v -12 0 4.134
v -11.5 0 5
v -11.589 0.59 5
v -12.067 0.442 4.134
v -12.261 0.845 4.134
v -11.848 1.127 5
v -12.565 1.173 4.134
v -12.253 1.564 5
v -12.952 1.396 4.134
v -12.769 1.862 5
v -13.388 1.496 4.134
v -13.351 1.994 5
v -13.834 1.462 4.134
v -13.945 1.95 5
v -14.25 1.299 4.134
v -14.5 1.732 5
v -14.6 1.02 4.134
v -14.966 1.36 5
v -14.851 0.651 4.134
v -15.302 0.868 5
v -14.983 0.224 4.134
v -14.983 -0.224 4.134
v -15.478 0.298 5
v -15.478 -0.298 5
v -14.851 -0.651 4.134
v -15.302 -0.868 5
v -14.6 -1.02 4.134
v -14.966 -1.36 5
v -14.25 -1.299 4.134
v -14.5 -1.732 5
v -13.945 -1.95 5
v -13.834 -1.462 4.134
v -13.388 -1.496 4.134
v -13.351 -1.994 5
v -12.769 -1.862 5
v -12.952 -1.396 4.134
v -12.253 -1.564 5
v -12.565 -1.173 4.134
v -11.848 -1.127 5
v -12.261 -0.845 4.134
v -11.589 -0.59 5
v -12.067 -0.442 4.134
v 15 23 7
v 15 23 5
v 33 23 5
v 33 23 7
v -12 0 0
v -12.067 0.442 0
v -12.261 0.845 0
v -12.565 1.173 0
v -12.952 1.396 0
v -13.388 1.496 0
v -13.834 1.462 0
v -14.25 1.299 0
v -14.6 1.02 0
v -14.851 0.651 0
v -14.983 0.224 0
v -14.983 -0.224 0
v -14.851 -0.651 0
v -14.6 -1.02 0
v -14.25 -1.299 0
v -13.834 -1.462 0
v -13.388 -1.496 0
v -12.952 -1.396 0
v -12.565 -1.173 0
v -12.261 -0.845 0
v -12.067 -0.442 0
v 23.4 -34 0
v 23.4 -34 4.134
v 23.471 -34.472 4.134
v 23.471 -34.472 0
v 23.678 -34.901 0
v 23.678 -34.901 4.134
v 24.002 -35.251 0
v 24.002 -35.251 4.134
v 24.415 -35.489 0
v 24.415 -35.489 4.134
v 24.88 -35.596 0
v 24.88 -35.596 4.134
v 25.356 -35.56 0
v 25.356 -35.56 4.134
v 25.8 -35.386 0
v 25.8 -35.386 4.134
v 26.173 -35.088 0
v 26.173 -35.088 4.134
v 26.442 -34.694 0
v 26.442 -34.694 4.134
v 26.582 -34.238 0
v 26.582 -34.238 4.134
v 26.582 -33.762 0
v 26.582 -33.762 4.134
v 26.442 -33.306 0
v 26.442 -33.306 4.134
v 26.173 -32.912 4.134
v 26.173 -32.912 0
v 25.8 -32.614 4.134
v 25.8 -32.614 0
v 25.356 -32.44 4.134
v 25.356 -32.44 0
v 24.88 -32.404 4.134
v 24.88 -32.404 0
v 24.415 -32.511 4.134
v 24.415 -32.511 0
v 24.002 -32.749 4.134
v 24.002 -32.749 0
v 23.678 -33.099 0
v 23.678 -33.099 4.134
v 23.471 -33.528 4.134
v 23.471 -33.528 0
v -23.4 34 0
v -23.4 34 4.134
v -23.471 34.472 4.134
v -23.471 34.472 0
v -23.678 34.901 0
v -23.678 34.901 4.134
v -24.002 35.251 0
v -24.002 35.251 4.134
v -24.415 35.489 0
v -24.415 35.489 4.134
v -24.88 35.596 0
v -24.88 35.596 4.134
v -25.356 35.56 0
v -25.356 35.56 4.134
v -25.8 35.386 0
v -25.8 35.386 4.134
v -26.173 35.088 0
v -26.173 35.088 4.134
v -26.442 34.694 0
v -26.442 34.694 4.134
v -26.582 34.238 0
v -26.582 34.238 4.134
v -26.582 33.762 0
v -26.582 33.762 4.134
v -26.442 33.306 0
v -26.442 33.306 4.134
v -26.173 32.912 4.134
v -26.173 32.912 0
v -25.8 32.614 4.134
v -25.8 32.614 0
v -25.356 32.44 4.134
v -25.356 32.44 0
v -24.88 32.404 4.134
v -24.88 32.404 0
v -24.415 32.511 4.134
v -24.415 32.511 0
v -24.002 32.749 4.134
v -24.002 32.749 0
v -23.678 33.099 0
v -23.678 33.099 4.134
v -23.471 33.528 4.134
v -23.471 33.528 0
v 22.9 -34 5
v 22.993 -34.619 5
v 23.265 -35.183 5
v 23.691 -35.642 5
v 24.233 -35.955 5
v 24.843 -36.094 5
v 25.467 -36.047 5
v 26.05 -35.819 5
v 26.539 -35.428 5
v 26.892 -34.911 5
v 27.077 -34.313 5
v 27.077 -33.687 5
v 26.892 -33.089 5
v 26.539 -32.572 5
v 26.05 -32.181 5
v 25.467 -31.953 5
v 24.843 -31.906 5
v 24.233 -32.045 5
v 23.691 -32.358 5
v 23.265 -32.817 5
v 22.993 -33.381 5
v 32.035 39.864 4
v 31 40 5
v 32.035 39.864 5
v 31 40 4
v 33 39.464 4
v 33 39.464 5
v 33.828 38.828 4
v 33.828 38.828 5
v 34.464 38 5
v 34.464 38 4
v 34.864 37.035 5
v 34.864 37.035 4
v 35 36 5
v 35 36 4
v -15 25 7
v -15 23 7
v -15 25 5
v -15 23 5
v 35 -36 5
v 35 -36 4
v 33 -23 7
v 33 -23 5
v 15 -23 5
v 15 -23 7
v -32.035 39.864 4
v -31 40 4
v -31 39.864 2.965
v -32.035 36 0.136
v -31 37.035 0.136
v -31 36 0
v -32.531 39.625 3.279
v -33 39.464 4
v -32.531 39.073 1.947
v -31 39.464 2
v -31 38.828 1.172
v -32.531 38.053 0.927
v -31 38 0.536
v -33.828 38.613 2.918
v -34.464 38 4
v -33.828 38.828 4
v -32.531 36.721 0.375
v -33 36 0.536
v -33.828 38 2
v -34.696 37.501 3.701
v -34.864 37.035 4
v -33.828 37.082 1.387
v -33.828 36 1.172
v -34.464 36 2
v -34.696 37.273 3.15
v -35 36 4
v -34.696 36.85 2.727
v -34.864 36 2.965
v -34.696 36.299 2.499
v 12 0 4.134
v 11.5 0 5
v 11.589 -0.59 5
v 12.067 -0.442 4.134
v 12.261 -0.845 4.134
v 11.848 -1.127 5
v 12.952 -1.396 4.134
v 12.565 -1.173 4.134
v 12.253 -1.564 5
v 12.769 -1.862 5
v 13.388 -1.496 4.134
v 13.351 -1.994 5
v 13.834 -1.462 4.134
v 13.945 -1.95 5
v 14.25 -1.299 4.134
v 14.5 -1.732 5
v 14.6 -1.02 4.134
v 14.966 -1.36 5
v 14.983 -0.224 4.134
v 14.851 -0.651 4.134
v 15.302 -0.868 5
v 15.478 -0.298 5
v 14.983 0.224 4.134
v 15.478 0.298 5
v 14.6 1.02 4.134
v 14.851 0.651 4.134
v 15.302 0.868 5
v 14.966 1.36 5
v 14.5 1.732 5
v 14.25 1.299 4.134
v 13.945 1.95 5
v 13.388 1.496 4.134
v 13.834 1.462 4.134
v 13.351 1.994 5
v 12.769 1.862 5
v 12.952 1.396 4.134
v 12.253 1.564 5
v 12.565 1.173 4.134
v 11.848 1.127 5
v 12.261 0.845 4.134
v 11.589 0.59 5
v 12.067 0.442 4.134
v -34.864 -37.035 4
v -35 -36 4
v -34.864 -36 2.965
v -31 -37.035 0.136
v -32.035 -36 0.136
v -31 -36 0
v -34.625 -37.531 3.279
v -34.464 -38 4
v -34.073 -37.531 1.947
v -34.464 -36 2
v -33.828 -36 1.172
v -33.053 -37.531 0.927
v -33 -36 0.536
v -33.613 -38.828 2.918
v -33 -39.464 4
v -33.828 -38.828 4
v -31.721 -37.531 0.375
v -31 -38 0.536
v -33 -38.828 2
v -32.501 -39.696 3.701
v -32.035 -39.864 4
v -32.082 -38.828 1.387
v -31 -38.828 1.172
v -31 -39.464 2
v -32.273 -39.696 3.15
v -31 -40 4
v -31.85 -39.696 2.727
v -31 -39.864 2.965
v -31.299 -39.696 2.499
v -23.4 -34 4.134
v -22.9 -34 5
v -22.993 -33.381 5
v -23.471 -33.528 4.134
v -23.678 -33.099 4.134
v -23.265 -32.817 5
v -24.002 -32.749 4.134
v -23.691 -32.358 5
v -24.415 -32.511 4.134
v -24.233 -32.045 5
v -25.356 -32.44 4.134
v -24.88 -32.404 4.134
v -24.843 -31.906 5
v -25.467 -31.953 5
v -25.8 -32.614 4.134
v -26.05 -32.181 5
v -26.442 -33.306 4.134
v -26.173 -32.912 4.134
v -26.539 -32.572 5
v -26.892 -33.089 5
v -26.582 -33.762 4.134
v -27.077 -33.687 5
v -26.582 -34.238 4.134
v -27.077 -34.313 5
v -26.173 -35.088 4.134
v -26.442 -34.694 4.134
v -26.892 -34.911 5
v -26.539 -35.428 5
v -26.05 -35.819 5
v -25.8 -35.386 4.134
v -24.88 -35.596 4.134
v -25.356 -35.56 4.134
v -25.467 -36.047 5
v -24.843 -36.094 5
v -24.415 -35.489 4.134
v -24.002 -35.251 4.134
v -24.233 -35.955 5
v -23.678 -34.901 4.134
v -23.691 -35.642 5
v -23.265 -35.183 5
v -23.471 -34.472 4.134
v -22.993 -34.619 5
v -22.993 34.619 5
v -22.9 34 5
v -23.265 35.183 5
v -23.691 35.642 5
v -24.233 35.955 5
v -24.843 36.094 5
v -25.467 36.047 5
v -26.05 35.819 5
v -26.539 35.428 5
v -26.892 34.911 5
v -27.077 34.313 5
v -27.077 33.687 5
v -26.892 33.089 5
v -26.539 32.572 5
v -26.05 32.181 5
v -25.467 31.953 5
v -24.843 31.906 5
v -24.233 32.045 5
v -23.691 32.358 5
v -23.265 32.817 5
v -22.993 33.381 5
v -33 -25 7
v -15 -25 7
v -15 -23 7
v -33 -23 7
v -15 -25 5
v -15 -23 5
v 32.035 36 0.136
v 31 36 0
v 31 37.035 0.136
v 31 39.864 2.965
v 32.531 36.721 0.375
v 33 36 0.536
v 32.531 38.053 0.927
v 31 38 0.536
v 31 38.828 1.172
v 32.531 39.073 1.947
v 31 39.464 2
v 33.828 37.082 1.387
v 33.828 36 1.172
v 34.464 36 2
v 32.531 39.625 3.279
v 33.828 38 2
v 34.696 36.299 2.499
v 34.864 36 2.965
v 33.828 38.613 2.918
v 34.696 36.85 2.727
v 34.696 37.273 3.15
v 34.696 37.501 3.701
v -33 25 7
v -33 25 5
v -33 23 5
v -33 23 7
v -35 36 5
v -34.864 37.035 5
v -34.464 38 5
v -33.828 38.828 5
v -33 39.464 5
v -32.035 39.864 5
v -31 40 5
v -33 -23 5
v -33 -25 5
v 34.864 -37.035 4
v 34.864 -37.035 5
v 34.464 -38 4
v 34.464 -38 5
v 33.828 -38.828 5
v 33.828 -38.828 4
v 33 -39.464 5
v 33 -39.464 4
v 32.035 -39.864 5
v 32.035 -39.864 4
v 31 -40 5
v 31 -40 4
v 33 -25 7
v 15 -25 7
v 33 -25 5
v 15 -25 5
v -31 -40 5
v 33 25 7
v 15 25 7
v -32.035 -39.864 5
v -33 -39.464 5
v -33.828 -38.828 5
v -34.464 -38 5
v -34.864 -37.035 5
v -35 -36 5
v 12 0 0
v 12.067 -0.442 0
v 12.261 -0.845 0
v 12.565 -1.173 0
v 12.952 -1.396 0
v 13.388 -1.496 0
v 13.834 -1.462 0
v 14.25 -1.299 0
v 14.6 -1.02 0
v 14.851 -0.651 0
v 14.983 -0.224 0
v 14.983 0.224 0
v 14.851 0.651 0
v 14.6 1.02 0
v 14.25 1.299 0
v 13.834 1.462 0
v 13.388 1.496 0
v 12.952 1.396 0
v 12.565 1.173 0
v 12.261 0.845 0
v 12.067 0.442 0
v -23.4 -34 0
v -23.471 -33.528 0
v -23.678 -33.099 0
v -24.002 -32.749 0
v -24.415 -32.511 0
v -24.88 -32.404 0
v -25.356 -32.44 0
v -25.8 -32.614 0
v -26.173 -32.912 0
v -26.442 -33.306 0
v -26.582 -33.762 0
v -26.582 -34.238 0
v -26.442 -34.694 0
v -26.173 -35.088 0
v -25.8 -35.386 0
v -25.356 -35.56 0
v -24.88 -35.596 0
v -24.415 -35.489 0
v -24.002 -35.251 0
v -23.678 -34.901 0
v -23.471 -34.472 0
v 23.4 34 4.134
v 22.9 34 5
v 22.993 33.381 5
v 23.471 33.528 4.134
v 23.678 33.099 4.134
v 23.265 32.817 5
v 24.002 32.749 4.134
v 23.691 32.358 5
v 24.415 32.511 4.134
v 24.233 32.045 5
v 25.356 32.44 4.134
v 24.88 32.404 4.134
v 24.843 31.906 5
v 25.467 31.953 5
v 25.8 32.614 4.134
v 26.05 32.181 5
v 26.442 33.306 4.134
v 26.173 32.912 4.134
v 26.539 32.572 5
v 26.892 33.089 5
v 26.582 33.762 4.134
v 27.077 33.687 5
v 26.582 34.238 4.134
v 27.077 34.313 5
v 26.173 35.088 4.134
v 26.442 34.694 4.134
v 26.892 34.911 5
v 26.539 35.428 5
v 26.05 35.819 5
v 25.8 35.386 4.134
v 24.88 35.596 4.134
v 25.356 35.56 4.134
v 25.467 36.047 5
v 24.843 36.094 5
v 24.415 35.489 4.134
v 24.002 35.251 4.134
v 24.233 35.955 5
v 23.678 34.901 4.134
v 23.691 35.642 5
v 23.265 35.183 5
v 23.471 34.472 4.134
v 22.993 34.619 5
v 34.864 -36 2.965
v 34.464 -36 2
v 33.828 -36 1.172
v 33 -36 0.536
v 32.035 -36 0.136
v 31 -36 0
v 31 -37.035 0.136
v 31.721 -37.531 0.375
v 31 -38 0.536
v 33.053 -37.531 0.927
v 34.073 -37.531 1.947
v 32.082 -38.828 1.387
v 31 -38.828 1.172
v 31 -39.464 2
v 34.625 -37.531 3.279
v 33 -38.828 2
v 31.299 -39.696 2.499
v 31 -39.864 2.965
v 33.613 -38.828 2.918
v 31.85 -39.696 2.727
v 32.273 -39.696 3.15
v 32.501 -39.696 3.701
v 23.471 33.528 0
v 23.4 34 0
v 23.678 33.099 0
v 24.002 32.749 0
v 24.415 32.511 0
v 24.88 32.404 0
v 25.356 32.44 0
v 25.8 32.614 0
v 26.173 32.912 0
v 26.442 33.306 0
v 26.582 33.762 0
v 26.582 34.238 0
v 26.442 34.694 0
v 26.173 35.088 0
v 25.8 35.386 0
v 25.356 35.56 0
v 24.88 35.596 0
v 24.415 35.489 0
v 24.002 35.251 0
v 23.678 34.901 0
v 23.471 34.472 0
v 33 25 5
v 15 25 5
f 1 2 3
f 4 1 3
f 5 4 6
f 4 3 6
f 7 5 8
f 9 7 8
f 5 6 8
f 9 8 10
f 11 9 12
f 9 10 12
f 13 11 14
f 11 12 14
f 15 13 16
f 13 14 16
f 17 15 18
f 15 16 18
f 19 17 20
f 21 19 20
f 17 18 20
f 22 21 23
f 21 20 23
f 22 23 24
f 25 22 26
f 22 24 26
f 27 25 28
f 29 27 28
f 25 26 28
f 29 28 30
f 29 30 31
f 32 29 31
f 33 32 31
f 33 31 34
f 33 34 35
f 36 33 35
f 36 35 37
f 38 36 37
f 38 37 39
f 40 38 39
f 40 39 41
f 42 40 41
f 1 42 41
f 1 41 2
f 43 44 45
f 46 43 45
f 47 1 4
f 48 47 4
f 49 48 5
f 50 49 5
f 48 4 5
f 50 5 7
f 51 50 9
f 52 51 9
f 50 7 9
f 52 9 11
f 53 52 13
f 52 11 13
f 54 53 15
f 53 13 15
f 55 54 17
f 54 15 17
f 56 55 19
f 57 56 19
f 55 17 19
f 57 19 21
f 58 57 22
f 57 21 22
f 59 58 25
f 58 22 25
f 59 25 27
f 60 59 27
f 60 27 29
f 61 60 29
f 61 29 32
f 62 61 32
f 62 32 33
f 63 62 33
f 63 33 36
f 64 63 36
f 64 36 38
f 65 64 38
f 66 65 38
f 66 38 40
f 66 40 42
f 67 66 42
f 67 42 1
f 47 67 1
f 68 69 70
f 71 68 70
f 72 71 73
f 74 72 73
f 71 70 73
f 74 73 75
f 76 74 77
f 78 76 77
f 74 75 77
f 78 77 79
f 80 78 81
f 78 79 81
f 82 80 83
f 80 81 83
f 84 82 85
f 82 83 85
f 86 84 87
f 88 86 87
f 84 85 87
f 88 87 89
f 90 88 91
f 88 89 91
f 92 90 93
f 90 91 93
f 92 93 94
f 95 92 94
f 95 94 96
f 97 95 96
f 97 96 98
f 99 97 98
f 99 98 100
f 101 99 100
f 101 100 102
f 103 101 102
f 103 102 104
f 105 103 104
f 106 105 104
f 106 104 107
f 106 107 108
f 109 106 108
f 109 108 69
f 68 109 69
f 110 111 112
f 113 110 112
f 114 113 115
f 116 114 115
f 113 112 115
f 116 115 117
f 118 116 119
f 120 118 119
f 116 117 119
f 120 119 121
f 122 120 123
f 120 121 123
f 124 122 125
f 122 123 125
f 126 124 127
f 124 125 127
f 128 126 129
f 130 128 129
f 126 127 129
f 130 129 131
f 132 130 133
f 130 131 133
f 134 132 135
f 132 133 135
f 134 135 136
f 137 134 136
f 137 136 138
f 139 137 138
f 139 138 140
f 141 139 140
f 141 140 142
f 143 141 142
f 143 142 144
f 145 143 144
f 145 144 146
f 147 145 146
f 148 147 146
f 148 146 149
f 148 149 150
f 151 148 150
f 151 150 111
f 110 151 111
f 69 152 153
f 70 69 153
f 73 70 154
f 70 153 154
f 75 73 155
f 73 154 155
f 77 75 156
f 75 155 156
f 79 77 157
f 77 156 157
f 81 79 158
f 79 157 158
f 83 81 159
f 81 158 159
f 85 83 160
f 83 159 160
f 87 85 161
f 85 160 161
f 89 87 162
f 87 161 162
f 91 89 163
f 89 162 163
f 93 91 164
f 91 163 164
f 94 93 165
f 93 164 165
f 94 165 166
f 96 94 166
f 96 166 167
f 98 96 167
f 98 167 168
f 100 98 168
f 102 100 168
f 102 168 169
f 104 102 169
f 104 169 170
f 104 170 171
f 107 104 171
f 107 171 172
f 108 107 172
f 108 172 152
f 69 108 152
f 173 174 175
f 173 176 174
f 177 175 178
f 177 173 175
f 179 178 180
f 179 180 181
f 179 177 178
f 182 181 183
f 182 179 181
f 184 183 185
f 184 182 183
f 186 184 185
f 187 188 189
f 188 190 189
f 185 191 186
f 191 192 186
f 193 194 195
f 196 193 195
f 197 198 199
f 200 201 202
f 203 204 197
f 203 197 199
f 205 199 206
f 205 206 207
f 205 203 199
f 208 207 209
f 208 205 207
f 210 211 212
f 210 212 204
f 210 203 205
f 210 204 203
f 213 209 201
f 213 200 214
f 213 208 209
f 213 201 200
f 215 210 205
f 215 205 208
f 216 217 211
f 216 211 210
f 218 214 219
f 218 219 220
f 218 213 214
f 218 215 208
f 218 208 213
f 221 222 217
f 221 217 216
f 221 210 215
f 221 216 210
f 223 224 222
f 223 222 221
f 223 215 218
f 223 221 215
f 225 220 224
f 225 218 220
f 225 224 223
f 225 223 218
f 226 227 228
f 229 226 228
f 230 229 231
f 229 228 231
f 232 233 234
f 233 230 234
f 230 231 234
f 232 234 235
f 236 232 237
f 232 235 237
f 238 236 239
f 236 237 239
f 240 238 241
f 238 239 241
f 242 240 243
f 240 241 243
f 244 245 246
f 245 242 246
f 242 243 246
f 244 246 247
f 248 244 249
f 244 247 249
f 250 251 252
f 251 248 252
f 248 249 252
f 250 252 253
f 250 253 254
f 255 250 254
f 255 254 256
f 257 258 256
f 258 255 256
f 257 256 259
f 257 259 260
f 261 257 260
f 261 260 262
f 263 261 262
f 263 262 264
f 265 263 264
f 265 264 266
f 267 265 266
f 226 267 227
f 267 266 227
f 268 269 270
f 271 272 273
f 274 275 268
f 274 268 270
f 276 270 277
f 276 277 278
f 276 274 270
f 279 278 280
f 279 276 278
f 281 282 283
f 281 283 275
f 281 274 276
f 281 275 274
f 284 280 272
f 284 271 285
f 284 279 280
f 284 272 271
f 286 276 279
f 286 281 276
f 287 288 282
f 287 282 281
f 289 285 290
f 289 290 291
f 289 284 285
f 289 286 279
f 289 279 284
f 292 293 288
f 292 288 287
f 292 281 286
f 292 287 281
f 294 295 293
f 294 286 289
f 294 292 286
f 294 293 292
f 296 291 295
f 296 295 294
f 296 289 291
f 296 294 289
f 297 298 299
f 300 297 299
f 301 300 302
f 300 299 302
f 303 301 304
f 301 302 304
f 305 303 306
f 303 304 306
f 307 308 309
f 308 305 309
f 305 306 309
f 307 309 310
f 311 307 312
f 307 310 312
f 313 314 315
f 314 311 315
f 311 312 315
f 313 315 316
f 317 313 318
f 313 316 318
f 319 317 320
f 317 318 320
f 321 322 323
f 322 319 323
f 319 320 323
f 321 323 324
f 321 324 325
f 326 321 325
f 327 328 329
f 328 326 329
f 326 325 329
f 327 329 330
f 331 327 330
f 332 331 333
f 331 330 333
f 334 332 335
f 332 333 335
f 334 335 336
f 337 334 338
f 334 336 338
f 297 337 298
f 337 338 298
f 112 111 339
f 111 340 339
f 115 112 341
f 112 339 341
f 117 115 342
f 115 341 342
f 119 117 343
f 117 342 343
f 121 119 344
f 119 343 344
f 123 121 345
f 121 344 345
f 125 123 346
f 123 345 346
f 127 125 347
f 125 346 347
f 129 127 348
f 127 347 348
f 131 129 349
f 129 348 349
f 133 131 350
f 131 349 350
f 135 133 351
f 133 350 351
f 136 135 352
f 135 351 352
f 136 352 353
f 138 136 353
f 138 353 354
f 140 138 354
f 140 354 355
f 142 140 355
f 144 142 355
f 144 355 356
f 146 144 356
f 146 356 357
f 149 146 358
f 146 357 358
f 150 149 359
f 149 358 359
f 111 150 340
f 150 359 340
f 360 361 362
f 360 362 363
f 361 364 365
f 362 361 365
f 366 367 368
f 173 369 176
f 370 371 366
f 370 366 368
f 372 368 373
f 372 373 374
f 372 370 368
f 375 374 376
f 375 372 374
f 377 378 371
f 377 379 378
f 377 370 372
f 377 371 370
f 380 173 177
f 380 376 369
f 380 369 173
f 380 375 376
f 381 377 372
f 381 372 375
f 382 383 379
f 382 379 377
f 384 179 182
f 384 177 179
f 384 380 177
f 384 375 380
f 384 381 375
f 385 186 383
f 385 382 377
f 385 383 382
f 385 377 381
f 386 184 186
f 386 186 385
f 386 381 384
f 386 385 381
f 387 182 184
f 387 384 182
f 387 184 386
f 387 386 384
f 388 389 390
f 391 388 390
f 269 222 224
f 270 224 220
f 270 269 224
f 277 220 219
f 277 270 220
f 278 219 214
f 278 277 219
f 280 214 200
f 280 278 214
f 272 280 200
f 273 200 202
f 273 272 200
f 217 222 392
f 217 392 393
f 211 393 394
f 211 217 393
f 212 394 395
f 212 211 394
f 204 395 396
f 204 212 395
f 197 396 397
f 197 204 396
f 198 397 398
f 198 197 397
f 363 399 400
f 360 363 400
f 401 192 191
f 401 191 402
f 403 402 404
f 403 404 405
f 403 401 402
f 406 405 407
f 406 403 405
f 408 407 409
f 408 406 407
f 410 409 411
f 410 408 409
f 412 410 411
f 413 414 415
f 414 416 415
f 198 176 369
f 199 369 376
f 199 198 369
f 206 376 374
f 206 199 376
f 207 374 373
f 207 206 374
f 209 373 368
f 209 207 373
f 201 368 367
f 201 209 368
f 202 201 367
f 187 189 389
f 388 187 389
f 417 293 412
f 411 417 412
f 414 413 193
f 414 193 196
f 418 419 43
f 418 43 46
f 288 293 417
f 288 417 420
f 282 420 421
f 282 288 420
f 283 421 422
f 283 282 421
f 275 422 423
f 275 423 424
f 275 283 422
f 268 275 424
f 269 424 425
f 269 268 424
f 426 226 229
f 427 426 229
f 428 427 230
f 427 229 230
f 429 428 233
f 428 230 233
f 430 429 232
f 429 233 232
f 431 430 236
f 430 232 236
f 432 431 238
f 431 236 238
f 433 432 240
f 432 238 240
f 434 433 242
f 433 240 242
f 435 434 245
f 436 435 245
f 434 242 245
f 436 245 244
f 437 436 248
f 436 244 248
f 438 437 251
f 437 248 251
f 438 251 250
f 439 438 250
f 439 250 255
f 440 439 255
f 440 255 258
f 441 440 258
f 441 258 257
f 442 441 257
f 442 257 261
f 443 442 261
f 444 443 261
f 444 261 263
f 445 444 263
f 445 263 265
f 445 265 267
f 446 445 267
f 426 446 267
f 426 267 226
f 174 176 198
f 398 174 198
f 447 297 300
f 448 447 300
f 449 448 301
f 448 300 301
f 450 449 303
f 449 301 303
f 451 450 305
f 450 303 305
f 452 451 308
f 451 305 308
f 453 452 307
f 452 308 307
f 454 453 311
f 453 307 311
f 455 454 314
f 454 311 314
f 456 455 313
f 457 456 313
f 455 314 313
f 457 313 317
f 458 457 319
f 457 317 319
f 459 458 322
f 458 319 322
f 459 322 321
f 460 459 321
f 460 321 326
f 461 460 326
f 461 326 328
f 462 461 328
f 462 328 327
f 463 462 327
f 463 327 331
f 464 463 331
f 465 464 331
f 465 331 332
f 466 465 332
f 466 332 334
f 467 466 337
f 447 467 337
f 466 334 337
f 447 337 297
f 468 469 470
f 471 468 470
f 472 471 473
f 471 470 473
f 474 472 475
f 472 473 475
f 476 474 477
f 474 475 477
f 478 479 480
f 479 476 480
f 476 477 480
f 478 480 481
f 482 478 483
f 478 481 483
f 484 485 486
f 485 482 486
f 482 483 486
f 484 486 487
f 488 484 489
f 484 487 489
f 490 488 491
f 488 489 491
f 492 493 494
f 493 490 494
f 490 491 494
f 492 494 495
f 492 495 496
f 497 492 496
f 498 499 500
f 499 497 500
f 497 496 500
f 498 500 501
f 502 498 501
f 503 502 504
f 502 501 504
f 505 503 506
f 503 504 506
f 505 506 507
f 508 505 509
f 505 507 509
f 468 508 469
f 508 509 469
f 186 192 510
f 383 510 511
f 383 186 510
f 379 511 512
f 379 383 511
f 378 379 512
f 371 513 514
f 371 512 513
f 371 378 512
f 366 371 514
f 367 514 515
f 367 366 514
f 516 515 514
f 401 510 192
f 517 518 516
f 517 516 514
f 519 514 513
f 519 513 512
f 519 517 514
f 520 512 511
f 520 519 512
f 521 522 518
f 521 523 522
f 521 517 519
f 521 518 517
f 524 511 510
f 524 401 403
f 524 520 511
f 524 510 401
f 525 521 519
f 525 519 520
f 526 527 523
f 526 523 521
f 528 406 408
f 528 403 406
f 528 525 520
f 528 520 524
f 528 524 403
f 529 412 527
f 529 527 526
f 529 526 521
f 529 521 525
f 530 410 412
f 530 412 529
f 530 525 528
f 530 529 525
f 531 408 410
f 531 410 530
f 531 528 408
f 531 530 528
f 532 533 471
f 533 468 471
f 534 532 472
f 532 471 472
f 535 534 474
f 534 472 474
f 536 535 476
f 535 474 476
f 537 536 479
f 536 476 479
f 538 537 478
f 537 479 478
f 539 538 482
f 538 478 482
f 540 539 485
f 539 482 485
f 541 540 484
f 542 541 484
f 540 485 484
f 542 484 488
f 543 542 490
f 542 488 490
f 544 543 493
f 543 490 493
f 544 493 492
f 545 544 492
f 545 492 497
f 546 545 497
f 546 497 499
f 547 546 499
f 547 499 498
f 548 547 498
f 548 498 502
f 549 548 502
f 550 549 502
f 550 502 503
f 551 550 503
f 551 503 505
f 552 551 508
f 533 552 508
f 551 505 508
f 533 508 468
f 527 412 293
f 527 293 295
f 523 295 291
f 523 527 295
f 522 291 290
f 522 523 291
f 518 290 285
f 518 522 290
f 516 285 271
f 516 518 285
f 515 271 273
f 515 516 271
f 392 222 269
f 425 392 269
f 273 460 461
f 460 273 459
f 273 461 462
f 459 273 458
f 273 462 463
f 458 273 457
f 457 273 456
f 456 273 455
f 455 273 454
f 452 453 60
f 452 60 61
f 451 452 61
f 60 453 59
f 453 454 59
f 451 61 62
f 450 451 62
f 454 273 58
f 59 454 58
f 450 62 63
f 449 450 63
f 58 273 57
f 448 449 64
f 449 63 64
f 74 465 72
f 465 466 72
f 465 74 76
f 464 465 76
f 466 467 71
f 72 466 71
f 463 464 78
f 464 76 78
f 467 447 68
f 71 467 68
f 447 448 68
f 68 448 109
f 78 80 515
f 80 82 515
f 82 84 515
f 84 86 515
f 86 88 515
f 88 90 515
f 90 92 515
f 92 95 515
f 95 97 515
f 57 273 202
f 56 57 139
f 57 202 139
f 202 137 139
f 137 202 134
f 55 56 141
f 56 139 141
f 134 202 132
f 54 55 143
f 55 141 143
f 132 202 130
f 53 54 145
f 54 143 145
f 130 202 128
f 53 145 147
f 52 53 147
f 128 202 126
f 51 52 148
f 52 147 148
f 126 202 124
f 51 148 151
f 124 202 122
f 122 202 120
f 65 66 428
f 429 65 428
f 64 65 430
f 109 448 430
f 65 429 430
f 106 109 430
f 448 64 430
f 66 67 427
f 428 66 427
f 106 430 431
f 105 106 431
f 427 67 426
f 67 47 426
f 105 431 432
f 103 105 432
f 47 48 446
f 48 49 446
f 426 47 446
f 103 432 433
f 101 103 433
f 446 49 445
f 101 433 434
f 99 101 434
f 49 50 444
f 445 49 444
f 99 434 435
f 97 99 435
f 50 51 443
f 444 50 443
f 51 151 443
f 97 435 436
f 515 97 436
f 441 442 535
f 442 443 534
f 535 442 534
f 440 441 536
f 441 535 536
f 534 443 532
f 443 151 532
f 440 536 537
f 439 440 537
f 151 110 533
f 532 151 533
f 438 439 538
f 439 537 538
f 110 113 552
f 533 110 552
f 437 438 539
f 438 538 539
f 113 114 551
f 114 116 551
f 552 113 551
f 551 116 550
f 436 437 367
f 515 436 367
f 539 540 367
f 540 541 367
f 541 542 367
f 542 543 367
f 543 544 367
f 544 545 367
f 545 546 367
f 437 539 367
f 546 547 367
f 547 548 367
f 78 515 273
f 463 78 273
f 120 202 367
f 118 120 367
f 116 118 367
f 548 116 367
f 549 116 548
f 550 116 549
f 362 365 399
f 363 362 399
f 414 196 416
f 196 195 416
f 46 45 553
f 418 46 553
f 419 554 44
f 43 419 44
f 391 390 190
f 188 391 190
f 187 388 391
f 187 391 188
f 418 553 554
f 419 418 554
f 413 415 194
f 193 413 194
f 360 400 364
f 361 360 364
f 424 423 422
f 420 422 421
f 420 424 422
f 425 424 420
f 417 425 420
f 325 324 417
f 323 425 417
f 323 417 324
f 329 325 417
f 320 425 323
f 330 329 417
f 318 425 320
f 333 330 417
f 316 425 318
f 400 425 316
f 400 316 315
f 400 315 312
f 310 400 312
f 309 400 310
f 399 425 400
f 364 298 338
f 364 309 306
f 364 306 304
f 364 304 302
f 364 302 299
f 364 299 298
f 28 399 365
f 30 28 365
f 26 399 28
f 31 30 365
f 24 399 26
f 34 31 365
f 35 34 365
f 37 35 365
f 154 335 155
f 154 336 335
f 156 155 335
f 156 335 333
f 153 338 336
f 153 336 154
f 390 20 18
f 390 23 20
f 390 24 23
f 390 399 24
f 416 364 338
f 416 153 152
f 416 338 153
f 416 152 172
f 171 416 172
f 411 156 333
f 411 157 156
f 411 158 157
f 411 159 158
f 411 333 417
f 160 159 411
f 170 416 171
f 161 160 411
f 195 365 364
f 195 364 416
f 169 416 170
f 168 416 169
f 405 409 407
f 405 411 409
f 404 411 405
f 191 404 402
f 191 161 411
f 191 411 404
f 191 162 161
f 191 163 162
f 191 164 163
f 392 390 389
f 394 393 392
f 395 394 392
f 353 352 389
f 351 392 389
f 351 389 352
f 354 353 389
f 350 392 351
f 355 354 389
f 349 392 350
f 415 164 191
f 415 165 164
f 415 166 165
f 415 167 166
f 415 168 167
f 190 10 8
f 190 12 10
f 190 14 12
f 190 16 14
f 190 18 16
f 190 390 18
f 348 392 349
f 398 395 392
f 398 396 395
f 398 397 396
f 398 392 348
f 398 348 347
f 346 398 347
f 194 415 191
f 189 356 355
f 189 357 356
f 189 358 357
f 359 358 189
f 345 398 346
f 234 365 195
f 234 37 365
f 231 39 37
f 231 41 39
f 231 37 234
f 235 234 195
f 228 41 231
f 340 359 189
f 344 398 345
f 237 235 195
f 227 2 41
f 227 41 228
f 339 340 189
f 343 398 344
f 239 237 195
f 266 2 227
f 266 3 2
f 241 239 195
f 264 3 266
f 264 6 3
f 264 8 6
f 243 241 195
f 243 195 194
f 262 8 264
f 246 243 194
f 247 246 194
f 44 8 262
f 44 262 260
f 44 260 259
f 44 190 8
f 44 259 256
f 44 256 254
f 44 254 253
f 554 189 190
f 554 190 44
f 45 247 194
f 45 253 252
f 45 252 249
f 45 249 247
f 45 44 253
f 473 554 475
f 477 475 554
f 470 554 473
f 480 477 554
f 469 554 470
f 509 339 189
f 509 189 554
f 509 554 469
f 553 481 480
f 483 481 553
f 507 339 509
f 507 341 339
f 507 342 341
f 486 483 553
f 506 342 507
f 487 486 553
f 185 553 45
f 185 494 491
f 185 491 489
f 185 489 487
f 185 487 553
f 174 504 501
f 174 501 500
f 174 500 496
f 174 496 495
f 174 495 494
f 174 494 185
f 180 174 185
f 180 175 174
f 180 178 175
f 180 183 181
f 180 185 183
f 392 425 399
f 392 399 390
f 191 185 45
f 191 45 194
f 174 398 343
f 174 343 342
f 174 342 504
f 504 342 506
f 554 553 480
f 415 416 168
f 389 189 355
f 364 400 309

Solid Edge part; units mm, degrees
sketch "Sketch1" plane through (0, 0, 0) normal (0, 0, 1) x (1, 0, 0)
  line L0 (-35, -40) -> (35, -40)
  line L1 (35, -40) -> (35, 40)
  line L2 (35, 40) -> (-35, 40)
  line L3 (-35, 40) -> (-35, -40)
  dimension "D1" = 80
  dimension "D2" = 70
extrude "Protrusion1" add sketch "Sketch1" along normal blind 5
sketch "Sketch2" plane through (0, 0, 5) normal (0, 0, 1) x (1, 0, 0)
  circle A0 centre (-25, 34) radius 1.6
  dimension "D1" = 6
  dimension "D2" = 10
  dimension "D3" = 3.2
extrude "Cutout1" cut sketch "Sketch2" against normal through all
mirror "Mirror1" about plane through (0, 0, 0) normal (1, 0, 0) of "Cutout1"
mirror "Mirror2" about plane through (0, 0, 0) normal (0, -1, 0) of "Cutout1", "Mirror1"
sketch "Sketch3" plane through (0, 0, 5) normal (0, 0, 1) x (1, 0, 0)
  circle A0 centre (-13.5, 0) radius 1.5
  dimension "D1" = 3
  dimension "D2" = 13.5
extrude "Cutout2" cut sketch "Sketch3" against normal through all
mirror "Mirror3" about plane through (0, 0, 0) normal (1, 0, 0) of "Cutout2"
sketch "Sketch4" plane through (0, 0, 5) normal (0, 0, 1) x (1, 0, 0)
  line L0 (-33, 23) -> (-15, 23)
  line L1 (-15, 23) -> (-15, 25)
  line L2 (-15, 25) -> (-33, 25)
  line L3 (-33, 25) -> (-33, 23)
  dimension "D1" = 18
  dimension "D2" = 2
  dimension "D3" = 2
  dimension "D4" = 15
extrude "Extrusionsausprägung_2" add sketch "Sketch4" along normal blind 2
mirror "Mirror4" about plane through (0, 0, 0) normal (0, -1, 0) of "Extrusionsausprägung_2"
mirror "Mirror5" about plane through (0, 0, 0) normal (1, 0, 0) of "Mirror4", "Extrusionsausprägung_2"
fillet "Verrundung_1" radius 4 4 edges at (0, 40, 0) (35, 0, 0) (-35, 0, 0) (0, -40, 0)
fillet "Verrundung_2" radius 4 8 edges at (33.8284, 38.8284, 1.1716) (35, 40, 4.5) (33.8284, -38.8284, 1.1716) (35, -40, 4.5) (-33.8284, -38.8284, 1.1716) (-35, -40, 4.5) (-33.8284, 38.8284, 1.1716) (-35, 40, 4.5)
chamfer "Fase_1" distance 0.5 angle 60 2 edges at (15, 0, 5) (-15, 0, 5) measured on face at (-24.0333, -25.8667, 5)
chamfer "Fase_2" distance 0.5 angle 60 4 edges at (26.6, -34, 5) (-26.6, -34, 5) (-26.6, 34, 5) (26.6, 34, 5) measured on face at (-24.0333, -25.8667, 5)
properties material "Nylon, allgemein"
